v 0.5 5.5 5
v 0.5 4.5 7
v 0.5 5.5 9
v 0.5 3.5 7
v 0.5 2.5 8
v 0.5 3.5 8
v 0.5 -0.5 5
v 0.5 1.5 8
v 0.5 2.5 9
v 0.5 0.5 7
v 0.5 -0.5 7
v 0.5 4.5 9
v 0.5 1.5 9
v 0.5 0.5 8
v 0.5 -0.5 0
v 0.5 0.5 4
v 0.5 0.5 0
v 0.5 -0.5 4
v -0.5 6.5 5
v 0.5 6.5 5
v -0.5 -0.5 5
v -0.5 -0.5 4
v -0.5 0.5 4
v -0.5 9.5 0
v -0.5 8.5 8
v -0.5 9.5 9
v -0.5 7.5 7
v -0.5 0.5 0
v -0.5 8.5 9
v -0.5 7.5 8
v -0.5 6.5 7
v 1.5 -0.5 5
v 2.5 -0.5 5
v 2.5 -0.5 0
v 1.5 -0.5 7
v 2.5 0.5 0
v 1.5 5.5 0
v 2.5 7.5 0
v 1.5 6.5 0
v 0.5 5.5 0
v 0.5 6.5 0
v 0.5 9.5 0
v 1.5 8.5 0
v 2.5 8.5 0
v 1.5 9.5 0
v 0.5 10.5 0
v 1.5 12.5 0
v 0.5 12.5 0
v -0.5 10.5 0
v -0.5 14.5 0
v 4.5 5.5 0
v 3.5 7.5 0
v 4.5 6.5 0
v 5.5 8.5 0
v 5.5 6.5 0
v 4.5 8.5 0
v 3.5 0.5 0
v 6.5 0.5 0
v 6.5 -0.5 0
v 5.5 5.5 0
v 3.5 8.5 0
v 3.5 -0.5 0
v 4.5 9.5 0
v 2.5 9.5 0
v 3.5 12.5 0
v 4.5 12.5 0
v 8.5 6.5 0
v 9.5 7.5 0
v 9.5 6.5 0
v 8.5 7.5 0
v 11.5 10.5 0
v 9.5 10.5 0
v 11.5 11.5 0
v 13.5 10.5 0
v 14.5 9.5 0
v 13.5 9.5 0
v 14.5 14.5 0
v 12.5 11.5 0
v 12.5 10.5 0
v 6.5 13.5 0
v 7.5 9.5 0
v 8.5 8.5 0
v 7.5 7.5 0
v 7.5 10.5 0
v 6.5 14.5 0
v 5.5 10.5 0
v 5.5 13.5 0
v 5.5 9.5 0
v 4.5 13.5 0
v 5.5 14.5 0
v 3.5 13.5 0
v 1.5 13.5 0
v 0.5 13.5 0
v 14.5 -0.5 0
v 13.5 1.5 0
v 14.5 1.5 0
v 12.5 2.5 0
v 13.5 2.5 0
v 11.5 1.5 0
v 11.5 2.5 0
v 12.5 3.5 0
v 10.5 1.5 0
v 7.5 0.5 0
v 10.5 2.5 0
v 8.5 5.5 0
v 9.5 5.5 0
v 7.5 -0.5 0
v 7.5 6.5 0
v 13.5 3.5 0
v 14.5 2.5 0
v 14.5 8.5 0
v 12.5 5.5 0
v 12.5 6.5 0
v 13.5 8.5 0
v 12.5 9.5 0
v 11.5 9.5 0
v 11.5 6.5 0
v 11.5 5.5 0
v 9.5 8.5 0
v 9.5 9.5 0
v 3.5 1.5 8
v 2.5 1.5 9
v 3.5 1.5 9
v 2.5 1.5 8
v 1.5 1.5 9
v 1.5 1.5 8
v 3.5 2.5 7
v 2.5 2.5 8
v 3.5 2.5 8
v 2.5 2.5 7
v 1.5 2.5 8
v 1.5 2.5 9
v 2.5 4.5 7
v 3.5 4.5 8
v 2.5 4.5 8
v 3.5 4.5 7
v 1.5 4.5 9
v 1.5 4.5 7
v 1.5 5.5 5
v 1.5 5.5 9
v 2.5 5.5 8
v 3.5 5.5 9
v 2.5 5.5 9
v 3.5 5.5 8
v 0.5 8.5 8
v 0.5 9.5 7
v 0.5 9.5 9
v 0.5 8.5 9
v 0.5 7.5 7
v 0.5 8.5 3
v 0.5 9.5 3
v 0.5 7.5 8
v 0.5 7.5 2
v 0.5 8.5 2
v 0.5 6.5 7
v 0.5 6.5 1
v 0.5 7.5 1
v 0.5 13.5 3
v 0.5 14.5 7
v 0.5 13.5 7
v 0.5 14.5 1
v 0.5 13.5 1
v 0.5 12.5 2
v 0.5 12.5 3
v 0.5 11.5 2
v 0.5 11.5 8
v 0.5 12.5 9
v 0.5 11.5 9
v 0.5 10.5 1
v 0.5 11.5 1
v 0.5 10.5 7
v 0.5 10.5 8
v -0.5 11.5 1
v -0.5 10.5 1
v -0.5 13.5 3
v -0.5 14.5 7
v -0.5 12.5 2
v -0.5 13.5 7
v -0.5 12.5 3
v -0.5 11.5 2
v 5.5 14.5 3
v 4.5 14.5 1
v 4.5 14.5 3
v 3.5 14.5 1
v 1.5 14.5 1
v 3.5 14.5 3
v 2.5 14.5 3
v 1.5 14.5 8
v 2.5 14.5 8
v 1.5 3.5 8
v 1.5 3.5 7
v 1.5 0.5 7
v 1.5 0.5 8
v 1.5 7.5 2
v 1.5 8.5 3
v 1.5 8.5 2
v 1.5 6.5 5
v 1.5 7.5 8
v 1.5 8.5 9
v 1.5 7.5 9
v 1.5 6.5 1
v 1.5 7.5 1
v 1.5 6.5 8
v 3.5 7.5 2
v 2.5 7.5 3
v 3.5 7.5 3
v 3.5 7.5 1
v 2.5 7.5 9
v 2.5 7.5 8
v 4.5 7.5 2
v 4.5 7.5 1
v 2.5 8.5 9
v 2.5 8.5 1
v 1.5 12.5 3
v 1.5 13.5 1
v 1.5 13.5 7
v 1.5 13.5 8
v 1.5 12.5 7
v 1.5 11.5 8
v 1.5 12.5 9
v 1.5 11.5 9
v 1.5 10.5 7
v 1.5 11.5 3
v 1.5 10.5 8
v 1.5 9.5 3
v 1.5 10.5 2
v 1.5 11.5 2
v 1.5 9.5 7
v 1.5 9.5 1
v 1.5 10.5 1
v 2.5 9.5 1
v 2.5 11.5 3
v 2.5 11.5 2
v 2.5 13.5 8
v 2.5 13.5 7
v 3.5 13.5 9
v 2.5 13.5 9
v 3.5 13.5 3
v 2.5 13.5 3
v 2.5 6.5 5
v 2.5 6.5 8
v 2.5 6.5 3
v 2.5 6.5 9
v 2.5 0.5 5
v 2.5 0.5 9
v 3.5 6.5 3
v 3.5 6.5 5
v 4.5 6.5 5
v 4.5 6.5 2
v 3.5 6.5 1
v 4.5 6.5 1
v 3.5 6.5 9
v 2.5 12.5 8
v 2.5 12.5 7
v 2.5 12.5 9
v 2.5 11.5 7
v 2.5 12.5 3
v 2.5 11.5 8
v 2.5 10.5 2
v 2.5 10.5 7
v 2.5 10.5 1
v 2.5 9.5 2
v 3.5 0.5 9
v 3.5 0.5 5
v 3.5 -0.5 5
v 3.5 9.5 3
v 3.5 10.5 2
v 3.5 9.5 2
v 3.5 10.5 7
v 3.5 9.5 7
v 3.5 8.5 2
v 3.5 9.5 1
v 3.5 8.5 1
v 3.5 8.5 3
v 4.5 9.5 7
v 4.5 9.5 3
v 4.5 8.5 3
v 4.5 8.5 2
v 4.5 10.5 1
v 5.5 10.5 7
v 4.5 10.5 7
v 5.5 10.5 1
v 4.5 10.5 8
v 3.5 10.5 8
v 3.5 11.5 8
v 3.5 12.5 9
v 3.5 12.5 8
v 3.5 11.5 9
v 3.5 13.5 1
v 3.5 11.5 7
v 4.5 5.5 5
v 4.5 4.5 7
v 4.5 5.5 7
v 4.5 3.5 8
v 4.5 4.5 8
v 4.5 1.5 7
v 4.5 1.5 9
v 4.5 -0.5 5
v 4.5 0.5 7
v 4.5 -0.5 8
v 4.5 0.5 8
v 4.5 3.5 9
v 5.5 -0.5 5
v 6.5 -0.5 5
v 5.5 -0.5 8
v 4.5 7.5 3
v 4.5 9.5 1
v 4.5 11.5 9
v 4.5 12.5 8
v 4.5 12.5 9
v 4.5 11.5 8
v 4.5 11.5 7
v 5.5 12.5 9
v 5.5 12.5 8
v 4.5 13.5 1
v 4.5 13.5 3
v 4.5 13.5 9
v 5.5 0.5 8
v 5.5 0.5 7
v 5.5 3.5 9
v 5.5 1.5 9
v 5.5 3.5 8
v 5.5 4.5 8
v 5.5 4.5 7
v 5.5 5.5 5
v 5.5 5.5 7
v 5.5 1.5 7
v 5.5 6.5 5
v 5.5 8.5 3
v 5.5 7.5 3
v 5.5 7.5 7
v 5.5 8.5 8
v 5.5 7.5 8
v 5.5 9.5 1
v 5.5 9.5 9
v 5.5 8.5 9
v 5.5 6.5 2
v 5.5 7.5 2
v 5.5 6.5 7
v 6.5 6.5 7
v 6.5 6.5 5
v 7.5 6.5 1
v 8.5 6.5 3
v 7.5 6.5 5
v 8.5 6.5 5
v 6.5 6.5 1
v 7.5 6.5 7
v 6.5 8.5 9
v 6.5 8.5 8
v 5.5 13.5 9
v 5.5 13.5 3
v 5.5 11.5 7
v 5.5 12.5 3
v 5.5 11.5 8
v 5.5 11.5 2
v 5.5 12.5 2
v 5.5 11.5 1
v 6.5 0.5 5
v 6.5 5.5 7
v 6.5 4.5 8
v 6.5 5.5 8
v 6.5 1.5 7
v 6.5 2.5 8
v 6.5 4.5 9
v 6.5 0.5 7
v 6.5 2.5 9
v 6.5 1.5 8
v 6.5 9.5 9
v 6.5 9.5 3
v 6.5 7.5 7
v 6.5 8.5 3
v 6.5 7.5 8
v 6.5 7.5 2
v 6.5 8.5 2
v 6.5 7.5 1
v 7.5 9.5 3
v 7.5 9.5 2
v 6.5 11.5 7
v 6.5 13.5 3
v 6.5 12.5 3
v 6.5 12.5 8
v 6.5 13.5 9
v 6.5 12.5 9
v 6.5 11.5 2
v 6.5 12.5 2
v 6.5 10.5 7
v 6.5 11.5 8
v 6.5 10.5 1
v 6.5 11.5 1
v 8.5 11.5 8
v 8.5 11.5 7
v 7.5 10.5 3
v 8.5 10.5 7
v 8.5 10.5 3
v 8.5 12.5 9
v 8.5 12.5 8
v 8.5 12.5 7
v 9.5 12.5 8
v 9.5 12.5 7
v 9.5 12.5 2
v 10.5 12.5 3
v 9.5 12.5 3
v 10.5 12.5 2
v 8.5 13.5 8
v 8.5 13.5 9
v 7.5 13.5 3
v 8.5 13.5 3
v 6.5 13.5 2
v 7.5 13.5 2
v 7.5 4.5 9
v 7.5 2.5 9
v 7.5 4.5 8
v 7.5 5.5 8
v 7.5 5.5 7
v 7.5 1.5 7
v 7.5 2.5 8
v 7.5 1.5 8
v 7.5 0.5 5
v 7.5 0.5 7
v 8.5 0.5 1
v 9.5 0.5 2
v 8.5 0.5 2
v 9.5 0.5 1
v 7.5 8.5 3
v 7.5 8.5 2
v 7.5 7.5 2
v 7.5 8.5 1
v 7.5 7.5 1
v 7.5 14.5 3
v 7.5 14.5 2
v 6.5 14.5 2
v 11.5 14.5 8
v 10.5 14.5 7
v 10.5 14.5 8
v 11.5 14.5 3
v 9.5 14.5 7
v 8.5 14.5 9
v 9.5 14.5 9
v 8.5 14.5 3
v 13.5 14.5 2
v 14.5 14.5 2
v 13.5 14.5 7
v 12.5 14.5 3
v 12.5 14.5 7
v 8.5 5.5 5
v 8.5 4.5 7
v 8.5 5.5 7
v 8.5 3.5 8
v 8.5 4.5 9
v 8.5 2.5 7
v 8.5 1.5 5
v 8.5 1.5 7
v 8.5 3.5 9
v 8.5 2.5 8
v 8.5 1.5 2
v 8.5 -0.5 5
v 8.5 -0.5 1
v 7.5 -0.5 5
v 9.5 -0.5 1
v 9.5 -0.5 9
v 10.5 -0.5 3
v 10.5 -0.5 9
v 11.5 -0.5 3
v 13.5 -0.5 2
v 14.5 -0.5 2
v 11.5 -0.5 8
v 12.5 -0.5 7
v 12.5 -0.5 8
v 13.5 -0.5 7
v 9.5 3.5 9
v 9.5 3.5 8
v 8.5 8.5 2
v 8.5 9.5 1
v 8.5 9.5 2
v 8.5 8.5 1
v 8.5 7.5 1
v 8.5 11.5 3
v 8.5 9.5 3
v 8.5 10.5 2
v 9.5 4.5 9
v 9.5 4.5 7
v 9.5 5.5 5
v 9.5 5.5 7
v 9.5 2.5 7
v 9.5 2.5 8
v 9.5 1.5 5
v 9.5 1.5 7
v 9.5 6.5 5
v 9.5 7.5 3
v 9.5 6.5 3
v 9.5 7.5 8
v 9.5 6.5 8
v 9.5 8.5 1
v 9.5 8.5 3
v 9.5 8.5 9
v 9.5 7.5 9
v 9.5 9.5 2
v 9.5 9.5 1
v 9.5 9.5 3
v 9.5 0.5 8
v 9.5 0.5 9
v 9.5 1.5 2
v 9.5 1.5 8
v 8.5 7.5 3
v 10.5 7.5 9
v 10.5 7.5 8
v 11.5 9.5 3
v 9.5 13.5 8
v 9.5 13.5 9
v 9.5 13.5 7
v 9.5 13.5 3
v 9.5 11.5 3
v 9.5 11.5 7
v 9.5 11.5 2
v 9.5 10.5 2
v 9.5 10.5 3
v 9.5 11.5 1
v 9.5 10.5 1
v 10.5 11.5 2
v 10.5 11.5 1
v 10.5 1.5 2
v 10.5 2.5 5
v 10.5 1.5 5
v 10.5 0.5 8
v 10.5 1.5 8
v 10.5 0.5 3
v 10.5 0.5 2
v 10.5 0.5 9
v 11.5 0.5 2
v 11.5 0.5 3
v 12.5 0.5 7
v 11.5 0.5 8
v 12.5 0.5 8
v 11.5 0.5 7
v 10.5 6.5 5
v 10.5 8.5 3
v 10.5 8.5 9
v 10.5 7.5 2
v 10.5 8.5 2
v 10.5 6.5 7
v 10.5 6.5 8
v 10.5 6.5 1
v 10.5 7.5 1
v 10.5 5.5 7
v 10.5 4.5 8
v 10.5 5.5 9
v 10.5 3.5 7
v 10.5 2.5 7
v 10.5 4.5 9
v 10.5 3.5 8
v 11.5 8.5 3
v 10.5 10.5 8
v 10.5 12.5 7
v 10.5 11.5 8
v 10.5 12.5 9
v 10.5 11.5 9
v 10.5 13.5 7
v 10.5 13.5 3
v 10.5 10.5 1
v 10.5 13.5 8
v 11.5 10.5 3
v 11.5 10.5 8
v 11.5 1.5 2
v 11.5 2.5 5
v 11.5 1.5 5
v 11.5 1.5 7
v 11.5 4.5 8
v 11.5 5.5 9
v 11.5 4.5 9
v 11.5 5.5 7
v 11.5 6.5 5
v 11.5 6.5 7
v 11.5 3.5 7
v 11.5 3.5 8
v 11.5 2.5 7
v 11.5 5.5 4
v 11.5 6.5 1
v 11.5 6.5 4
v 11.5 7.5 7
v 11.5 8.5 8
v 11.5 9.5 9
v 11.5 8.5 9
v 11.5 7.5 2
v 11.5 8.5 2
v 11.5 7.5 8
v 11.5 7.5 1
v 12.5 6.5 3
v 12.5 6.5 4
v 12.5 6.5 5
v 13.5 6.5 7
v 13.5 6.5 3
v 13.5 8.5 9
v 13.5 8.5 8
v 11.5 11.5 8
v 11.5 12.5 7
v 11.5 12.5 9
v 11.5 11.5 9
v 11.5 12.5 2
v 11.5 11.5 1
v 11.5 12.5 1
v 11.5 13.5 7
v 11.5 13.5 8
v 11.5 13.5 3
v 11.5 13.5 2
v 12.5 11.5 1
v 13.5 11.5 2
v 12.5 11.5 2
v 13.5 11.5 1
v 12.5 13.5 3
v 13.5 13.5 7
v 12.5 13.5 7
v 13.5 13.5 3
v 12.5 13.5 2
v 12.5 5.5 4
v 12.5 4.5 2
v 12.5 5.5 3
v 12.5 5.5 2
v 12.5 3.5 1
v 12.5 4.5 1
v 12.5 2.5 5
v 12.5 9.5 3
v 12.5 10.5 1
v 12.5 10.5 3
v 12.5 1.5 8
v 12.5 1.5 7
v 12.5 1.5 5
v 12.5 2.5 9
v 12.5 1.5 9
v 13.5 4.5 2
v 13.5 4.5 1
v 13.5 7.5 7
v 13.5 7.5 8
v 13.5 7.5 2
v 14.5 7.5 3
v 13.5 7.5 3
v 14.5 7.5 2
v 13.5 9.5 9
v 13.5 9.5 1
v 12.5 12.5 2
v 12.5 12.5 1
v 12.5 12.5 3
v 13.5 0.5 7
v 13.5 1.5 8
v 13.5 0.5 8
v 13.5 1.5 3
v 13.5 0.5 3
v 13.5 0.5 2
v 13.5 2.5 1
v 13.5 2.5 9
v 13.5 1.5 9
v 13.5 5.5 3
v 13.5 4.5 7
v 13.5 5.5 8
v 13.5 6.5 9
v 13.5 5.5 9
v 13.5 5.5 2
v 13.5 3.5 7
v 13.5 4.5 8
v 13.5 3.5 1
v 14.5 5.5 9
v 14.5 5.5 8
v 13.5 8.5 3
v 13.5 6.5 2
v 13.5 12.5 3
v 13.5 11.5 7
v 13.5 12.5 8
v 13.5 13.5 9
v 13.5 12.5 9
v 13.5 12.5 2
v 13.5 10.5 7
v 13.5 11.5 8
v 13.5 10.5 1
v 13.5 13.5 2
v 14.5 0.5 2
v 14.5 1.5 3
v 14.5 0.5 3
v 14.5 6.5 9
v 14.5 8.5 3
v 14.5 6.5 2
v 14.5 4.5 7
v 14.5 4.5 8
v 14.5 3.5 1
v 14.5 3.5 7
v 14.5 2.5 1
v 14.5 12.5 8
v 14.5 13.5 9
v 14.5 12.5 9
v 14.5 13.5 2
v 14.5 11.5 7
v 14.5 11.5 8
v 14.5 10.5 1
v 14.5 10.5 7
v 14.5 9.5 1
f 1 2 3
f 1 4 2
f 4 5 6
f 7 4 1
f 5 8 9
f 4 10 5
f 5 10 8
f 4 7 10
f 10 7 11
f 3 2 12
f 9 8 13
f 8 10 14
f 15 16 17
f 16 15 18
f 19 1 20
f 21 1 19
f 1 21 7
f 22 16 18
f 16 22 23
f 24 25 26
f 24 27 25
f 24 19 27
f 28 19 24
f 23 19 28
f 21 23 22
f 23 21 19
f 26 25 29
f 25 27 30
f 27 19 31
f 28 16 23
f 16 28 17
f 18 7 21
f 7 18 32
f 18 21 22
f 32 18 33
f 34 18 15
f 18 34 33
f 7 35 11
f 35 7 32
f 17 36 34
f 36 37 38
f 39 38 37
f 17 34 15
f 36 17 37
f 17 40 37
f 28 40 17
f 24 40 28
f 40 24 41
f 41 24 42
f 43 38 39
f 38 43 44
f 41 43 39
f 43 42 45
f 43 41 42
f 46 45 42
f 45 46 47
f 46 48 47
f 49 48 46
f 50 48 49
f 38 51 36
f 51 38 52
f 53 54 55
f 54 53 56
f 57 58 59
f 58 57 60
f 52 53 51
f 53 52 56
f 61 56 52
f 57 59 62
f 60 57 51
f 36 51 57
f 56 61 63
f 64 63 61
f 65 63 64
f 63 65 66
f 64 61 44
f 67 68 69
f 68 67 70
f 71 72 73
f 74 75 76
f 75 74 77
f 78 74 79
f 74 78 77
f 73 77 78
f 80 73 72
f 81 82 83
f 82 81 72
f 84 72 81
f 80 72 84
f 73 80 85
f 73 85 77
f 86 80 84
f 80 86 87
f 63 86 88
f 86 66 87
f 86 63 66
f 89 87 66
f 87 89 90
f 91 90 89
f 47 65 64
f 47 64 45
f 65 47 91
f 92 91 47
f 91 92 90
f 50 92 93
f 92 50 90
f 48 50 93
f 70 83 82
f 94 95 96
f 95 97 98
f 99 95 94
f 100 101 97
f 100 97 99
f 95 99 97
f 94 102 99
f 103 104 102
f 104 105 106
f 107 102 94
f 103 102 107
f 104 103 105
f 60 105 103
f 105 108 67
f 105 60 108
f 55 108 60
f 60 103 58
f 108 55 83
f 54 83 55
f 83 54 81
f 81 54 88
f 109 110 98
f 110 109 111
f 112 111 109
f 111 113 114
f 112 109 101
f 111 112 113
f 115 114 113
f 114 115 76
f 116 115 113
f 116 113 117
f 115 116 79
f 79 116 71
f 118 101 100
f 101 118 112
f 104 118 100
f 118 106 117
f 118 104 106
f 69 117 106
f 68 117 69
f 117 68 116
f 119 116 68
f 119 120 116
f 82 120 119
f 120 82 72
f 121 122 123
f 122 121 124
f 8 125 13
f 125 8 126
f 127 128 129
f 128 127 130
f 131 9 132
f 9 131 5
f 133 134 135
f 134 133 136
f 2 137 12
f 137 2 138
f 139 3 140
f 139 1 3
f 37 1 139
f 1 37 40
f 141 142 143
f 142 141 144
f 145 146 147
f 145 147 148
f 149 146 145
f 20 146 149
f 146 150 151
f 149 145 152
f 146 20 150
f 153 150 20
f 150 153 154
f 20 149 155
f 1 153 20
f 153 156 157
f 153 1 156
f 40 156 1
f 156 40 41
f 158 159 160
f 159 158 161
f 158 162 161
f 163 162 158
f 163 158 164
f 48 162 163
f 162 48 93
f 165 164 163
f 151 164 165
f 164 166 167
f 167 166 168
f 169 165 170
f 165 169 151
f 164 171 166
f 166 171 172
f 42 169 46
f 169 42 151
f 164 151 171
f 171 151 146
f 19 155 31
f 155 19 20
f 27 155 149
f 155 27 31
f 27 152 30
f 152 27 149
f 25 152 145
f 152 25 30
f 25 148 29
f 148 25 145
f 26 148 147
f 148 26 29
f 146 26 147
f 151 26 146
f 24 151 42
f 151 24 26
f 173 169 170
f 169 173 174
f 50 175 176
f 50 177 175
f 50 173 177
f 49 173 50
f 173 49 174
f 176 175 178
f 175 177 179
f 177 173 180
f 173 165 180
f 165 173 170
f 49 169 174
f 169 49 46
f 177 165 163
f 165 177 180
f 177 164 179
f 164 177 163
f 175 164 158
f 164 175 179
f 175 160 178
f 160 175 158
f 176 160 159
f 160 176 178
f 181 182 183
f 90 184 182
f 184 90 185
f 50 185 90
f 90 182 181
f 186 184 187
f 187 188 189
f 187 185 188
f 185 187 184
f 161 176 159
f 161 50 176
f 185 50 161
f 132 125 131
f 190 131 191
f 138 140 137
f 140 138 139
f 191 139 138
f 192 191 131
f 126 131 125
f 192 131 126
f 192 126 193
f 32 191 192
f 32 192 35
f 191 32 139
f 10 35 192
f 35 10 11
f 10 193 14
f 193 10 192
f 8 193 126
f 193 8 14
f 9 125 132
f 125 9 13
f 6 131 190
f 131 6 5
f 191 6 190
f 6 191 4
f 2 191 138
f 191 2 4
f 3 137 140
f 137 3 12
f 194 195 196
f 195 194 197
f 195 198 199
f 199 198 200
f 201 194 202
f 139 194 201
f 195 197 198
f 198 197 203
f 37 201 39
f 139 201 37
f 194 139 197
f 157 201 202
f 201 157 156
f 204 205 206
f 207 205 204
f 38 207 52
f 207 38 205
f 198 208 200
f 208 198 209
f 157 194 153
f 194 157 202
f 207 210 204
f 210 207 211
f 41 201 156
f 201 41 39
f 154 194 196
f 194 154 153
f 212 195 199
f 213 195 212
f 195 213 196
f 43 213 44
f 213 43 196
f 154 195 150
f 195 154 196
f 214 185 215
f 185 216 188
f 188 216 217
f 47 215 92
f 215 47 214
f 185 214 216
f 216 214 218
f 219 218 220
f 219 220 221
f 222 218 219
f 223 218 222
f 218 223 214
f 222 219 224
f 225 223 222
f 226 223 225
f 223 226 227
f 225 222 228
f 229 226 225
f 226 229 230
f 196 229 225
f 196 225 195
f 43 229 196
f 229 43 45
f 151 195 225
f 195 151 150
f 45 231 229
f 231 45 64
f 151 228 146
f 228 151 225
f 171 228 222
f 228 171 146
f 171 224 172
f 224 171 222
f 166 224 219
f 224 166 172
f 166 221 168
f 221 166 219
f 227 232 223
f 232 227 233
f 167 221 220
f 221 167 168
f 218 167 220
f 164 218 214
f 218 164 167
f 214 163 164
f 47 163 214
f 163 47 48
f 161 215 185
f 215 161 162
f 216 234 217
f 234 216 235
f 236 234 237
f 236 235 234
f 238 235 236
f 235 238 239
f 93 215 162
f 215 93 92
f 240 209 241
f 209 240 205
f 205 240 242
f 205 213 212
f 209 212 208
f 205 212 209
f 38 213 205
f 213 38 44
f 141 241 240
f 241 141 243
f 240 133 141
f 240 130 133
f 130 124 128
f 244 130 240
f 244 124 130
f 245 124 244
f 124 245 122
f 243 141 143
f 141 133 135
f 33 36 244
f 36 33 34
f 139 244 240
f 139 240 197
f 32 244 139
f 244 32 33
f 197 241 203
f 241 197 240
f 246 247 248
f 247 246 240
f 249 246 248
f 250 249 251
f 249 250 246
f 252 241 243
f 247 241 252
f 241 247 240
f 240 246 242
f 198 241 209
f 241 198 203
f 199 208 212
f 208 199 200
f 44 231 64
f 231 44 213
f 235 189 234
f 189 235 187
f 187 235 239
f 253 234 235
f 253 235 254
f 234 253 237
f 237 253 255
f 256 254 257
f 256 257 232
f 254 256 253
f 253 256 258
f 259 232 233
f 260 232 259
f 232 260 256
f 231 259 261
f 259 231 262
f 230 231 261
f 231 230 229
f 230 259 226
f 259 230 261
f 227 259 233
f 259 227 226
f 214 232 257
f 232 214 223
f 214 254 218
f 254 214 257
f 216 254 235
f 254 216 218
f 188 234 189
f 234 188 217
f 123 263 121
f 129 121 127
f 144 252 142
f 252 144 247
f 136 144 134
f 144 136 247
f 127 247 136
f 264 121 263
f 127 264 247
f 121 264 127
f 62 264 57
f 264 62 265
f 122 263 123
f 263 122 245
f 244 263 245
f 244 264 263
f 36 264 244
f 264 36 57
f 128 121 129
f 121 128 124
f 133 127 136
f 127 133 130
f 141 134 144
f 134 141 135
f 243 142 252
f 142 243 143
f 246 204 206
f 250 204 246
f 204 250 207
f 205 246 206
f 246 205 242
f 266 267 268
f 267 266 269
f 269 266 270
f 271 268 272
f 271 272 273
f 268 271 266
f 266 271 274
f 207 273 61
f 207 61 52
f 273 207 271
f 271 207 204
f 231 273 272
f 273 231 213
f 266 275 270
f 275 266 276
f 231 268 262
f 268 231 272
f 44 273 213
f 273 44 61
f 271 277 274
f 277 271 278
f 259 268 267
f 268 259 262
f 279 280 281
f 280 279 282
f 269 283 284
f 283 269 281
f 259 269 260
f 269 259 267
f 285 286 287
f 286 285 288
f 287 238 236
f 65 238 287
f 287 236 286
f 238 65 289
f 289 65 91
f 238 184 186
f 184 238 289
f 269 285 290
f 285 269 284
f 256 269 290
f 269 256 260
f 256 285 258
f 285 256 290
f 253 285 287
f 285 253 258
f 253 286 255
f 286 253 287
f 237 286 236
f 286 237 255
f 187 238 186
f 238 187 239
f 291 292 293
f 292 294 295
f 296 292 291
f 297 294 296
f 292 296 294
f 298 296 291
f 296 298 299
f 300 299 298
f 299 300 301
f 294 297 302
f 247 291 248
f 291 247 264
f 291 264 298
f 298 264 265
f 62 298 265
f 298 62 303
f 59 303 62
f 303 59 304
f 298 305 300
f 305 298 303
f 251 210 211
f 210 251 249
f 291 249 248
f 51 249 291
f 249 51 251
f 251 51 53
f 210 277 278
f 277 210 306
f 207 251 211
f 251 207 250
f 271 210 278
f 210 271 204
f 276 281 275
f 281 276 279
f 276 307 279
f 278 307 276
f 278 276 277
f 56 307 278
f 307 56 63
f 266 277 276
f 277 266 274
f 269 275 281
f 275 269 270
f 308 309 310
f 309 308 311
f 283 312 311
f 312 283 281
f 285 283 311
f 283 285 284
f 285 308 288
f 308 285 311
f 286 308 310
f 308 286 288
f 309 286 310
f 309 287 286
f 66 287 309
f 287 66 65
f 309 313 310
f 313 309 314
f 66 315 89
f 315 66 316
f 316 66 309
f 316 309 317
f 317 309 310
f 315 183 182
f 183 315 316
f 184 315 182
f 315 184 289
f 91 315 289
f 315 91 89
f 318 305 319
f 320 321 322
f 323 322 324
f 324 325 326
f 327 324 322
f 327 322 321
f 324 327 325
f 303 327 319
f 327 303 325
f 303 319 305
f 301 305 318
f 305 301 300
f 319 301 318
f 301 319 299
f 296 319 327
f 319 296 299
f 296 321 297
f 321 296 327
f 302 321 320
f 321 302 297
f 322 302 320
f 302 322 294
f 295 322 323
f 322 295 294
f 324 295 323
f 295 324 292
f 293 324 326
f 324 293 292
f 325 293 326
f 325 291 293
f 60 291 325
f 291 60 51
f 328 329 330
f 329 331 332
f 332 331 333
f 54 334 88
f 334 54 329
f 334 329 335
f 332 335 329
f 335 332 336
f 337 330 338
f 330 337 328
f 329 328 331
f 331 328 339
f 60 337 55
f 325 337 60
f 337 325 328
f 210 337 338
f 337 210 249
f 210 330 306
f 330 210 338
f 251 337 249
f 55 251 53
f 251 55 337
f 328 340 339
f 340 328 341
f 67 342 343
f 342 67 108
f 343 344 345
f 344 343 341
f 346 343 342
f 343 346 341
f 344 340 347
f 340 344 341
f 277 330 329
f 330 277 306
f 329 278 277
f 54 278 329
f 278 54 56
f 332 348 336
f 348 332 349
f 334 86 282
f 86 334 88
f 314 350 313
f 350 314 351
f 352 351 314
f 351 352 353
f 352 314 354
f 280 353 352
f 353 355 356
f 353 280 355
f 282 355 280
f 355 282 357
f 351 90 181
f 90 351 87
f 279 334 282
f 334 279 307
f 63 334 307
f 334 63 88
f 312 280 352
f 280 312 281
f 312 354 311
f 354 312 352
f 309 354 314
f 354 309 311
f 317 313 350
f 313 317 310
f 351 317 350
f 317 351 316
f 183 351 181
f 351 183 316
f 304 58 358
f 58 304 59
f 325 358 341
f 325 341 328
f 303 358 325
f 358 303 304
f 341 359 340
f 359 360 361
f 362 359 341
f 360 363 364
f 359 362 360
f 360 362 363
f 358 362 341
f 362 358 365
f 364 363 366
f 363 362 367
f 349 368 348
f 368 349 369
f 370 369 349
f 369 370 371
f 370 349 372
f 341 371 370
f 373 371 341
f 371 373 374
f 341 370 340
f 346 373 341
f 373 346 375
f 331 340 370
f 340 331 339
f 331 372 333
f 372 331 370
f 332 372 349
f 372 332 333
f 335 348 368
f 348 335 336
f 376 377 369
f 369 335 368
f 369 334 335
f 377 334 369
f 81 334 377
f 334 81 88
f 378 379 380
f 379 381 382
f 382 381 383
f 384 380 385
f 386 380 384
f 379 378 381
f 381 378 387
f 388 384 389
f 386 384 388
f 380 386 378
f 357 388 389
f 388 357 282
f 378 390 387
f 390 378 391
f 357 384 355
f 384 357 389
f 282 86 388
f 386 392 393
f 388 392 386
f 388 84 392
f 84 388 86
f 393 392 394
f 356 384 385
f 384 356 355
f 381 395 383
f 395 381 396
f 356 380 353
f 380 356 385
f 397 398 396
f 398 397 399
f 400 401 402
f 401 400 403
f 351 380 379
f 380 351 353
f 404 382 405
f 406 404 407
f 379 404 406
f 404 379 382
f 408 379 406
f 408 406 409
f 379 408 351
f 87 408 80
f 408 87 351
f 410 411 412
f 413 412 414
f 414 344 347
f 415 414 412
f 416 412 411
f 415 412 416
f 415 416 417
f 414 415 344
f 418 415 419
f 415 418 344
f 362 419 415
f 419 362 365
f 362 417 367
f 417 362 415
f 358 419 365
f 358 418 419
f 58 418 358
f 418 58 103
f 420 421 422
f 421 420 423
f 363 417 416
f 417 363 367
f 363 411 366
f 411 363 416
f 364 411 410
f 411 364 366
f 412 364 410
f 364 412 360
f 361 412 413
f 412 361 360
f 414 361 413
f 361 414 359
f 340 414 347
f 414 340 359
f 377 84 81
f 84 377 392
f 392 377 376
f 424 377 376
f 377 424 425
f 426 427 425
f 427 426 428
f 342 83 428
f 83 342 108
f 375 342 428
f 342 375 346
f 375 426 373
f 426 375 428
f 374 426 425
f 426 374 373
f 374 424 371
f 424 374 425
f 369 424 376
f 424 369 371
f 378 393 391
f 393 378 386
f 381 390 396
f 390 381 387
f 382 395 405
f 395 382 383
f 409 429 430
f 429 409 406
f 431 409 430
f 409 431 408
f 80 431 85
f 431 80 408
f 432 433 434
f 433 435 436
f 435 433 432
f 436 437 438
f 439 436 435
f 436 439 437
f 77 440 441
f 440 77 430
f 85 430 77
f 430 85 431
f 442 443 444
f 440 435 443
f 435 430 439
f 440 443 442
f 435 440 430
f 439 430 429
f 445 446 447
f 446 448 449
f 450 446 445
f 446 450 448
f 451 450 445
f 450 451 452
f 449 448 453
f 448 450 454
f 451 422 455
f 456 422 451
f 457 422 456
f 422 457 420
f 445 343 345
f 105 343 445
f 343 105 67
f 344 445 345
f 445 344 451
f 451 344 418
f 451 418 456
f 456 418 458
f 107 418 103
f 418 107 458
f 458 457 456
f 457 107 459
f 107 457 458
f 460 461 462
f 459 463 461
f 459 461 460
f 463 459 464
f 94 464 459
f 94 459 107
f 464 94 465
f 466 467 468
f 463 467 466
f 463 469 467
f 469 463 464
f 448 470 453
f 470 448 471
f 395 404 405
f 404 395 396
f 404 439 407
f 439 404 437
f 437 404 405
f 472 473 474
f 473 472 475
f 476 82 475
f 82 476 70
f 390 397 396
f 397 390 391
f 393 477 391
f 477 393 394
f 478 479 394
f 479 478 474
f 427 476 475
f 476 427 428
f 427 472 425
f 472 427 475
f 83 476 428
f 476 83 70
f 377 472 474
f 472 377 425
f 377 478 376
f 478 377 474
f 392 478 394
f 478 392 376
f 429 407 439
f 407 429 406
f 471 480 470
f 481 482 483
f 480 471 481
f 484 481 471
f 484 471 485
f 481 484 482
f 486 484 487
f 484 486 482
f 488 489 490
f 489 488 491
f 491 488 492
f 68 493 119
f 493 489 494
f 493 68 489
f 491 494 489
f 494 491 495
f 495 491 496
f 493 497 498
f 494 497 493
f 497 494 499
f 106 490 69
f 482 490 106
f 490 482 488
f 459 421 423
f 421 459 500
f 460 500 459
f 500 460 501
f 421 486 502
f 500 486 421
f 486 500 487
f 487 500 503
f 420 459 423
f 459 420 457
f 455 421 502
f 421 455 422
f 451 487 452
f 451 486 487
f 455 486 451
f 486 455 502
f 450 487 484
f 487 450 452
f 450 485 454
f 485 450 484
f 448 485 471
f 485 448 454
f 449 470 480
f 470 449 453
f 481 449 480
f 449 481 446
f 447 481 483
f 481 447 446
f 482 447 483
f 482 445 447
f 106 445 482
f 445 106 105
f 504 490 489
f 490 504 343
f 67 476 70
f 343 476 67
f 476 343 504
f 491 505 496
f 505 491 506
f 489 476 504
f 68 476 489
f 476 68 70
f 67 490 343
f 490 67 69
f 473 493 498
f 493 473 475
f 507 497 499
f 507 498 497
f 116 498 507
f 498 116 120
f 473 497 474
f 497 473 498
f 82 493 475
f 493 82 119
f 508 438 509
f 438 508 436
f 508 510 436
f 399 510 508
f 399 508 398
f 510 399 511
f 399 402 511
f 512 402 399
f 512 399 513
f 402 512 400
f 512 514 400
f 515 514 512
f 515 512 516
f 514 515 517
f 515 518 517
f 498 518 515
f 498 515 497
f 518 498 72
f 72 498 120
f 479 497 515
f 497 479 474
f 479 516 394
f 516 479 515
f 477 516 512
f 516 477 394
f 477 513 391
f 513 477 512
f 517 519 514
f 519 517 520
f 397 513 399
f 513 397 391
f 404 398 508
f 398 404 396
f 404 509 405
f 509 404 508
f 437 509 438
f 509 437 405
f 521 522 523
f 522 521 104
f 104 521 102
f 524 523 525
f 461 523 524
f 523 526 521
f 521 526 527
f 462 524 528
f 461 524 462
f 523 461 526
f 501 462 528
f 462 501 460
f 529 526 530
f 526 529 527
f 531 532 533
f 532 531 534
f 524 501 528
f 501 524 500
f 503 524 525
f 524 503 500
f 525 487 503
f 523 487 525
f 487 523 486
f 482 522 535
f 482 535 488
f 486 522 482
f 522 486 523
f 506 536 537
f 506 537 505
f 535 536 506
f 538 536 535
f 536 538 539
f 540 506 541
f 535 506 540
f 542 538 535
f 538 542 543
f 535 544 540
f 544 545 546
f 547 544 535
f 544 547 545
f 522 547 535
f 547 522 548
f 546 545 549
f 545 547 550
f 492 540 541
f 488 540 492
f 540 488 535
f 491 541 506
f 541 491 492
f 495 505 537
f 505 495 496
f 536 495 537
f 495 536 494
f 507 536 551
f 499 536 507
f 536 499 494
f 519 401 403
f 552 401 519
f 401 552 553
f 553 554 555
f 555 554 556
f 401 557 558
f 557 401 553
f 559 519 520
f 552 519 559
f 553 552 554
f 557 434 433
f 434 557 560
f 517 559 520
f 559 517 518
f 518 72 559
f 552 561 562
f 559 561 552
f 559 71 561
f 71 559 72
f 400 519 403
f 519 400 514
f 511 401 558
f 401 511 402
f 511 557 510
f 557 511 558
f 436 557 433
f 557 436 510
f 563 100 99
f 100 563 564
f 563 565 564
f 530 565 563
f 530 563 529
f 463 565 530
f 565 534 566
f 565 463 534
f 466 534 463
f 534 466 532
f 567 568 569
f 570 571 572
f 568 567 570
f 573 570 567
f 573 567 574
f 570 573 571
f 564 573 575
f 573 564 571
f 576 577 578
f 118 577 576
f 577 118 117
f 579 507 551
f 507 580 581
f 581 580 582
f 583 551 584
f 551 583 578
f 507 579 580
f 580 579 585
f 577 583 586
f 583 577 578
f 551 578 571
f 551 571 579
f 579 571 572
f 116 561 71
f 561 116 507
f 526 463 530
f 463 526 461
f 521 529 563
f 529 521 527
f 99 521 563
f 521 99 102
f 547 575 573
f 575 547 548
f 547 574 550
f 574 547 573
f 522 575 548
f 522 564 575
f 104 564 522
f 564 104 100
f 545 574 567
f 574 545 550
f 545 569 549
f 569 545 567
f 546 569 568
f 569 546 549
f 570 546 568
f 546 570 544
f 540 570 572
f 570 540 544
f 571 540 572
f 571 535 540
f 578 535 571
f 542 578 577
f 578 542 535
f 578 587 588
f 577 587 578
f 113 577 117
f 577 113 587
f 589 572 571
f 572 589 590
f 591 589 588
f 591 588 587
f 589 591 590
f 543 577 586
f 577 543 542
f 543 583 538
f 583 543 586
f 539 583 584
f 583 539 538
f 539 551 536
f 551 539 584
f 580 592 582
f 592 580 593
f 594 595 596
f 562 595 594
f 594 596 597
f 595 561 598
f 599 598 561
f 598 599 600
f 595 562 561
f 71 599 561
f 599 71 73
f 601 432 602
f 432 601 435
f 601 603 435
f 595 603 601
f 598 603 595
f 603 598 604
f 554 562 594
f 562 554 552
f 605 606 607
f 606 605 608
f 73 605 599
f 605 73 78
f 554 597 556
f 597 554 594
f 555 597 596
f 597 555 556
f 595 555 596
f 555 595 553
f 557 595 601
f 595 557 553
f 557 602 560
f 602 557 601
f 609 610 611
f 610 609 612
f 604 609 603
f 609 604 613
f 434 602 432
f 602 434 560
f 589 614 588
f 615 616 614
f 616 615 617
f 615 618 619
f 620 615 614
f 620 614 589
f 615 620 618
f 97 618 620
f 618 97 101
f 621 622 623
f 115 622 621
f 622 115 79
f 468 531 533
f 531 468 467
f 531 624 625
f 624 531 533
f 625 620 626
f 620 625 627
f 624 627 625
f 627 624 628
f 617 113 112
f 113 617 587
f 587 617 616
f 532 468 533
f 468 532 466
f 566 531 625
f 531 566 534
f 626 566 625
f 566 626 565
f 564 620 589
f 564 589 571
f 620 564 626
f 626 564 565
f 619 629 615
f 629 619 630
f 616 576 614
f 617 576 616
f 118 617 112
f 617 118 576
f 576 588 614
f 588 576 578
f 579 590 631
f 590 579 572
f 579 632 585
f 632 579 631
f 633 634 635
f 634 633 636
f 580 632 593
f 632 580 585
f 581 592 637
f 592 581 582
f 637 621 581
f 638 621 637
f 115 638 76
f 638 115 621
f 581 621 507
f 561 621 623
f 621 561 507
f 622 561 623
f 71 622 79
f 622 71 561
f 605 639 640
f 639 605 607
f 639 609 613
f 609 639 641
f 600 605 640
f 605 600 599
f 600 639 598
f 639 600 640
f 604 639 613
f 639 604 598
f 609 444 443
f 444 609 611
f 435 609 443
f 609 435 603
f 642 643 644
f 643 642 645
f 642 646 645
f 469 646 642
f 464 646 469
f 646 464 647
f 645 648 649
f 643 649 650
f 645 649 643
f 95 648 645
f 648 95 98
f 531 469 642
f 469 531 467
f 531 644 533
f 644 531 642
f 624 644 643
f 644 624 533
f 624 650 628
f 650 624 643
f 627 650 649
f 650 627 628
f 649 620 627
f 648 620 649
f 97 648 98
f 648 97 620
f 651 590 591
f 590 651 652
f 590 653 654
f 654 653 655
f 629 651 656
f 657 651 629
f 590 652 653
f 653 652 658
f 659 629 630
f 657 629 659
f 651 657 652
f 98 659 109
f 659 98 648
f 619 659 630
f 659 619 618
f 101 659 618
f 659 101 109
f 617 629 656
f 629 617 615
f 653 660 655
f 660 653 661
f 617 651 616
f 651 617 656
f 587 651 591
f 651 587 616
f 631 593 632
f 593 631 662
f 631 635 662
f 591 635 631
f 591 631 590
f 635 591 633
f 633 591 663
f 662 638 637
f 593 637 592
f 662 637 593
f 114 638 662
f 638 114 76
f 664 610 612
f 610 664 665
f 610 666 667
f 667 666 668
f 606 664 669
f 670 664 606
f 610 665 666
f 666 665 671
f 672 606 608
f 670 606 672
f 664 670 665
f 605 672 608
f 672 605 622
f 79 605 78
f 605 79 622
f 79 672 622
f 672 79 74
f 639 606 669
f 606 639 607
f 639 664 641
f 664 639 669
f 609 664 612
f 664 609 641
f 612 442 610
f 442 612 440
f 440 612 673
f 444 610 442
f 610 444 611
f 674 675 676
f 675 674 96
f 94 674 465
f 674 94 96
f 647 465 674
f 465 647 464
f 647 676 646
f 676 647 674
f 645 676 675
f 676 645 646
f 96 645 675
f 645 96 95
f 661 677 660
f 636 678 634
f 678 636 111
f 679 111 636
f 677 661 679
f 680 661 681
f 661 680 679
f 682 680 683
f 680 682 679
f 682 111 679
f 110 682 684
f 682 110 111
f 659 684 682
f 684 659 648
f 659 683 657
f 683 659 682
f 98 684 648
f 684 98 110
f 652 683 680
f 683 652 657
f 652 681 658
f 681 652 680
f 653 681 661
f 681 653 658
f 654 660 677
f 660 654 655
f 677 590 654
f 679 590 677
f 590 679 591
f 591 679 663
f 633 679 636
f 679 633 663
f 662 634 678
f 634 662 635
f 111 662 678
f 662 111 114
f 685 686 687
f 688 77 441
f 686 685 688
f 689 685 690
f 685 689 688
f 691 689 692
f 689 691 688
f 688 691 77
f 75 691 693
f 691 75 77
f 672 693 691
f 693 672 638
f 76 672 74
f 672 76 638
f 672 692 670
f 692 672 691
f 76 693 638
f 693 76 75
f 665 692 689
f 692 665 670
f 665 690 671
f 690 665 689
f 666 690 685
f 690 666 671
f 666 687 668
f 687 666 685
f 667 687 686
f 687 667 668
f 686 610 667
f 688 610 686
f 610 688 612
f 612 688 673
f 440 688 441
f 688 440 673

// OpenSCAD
union() {
    translate([0, 0, 4.5]) color([1, 0, 0]) cube([1, 1, 1], center=true);
    translate([0, 1, 2.5]) cube([1, 1, 5], center=true);
    translate([0, 2, 2.5]) cube([1, 1, 5], center=true);
    translate([0, 3, 2.5]) cube([1, 1, 5], center=true);
    translate([0, 4, 2.5]) cube([1, 1, 5], center=true);
    translate([0, 5, 2.5]) cube([1, 1, 5], center=true);
    translate([0, 6, 2.5]) cube([1, 1, 5], center=true);
    translate([0, 7, 3.5]) cube([1, 1, 7], center=true);
    translate([0, 8, 4.0]) cube([1, 1, 8], center=true);
    translate([0, 9, 4.5]) cube([1, 1, 9], center=true);
    translate([0, 11, 0.5]) cube([1, 1, 1], center=true);
    translate([0, 12, 1.0]) cube([1, 1, 2], center=true);
    translate([0, 13, 1.5]) cube([1, 1, 3], center=true);
    translate([0, 14, 3.5]) cube([1, 1, 7], center=true);
    translate([1, 0, 3.5]) cube([1, 1, 7], center=true);
    translate([1, 1, 4.0]) cube([1, 1, 8], center=true);
    translate([1, 2, 4.5]) cube([1, 1, 9], center=true);
    translate([1, 3, 4.0]) cube([1, 1, 8], center=true);
    translate([1, 4, 3.5]) cube([1, 1, 7], center=true);
    translate([1, 5, 4.5]) cube([1, 1, 9], center=true);
    translate([1, 7, 0.5]) cube([1, 1, 1], center=true);
    translate([1, 8, 1.0]) cube([1, 1, 2], center=true);
    translate([1, 9, 1.5]) cube([1, 1, 3], center=true);
    translate([1, 10, 3.5]) cube([1, 1, 7], center=true);
    translate([1, 11, 4.0]) cube([1, 1, 8], center=true);
    translate([1, 12, 4.5]) cube([1, 1, 9], center=true);
    translate([1, 14, 0.5]) cube([1, 1, 1], center=true);
    translate([2, 0, 2.5]) cube([1, 1, 5], center=true);
    translate([2, 1, 2.5]) cube([1, 1, 5], center=true);
    translate([2, 2, 2.5]) cube([1, 1, 5], center=true);
    translate([2, 3, 2.5]) cube([1, 1, 5], center=true);
    translate([2, 4, 2.5]) cube([1, 1, 5], center=true);
    translate([2, 5, 2.5]) cube([1, 1, 5], center=true);
    translate([2, 6, 2.5]) cube([1, 1, 5], center=true);
    translate([2, 7, 4.0]) cube([1, 1, 8], center=true);
    translate([2, 8, 4.5]) cube([1, 1, 9], center=true);
    translate([2, 10, 0.5]) cube([1, 1, 1], center=true);
    translate([2, 11, 1.0]) cube([1, 1, 2], center=true);
    translate([2, 12, 1.5]) cube([1, 1, 3], center=true);
    translate([2, 13, 3.5]) cube([1, 1, 7], center=true);
    translate([2, 14, 4.0]) cube([1, 1, 8], center=true);
    translate([3, 1, 4.5]) cube([1, 1, 9], center=true);
    translate([3, 2, 4.0]) cube([1, 1, 8], center=true);
    translate([3, 3, 3.5]) cube([1, 1, 7], center=true);
    translate([3, 4, 3.5]) cube([1, 1, 7], center=true);
    translate([3, 5, 4.0]) cube([1, 1, 8], center=true);
    translate([3, 6, 4.5]) cube([1, 1, 9], center=true);
    translate([3, 7, 1.5]) cube([1, 1, 3], center=true);
    translate([3, 9, 0.5]) cube([1, 1, 1], center=true);
    translate([3, 10, 1.0]) cube([1, 1, 2], center=true);
    translate([3, 11, 3.5]) cube([1, 1, 7], center=true);
    translate([3, 12, 4.0]) cube([1, 1, 8], center=true);
    translate([3, 13, 4.5]) cube([1, 1, 9], center=true);
    translate([3, 14, 1.5]) cube([1, 1, 3], center=true);
    translate([4, 0, 2.5]) cube([1, 1, 5], center=true);
    translate([4, 1, 2.5]) cube([1, 1, 5], center=true);
    translate([4, 2, 2.5]) cube([1, 1, 5], center=true);
    translate([4, 3, 2.5]) cube([1, 1, 5], center=true);
    translate([4, 4, 2.5]) cube([1, 1, 5], center=true);
    translate([4, 5, 2.5]) cube([1, 1, 5], center=true);
    translate([4, 6, 2.5]) cube([1, 1, 5], center=true);
    translate([4, 7, 0.5]) cube([1, 1, 1], center=true);
    translate([4, 8, 1.0]) cube([1, 1, 2], center=true);
    translate([4, 9, 1.5]) cube([1, 1, 3], center=true);
    translate([4, 10, 3.5]) cube([1, 1, 7], center=true);
    translate([4, 11, 4.0]) cube([1, 1, 8], center=true);
    translate([4, 12, 4.5]) cube([1, 1, 9], center=true);
    translate([4, 14, 0.5]) cube([1, 1, 1], center=true);
    translate([5, 0, 4.0]) cube([1, 1, 8], center=true);
    translate([5, 1, 3.5]) cube([1, 1, 7], center=true);
    translate([5, 2, 4.5]) cube([1, 1, 9], center=true);
    translate([5, 3, 4.5]) cube([1, 1, 9], center=true);
    translate([5, 4, 4.0]) cube([1, 1, 8], center=true);
    translate([5, 5, 3.5]) cube([1, 1, 7], center=true);
    translate([5, 7, 1.0]) cube([1, 1, 2], center=true);
    translate([5, 8, 1.5]) cube([1, 1, 3], center=true);
    translate([5, 10, 0.5]) cube([1, 1, 1], center=true);
    translate([5, 11, 3.5]) cube([1, 1, 7], center=true);
    translate([5, 12, 4.0]) cube([1, 1, 8], center=true);
    translate([5, 13, 4.5]) cube([1, 1, 9], center=true);
    translate([5, 14, 1.5]) cube([1, 1, 3], center=true);
    translate([6, 0, 2.5]) cube([1, 1, 5], center=true);
    translate([6, 1, 2.5]) cube([1, 1, 5], center=true);
    translate([6, 2, 2.5]) cube([1, 1, 5], center=true);
    translate([6, 3, 2.5]) cube([1, 1, 5], center=true);
    translate([6, 4, 2.5]) cube([1, 1, 5], center=true);
    translate([6, 5, 2.5]) cube([1, 1, 5], center=true);
    translate([6, 6, 2.5]) cube([1, 1, 5], center=true);
    translate([6, 7, 3.5]) cube([1, 1, 7], center=true);
    translate([6, 8, 4.0]) cube([1, 1, 8], center=true);
    translate([6, 9, 4.5]) cube([1, 1, 9], center=true);
    translate([6, 11, 0.5]) cube([1, 1, 1], center=true);
    translate([6, 12, 1.0]) cube([1, 1, 2], center=true);
    translate([6, 13, 1.5]) cube([1, 1, 3], center=true);
    translate([7, 1, 3.5]) cube([1, 1, 7], center=true);
    translate([7, 2, 4.0]) cube([1, 1, 8], center=true);
    translate([7, 3, 4.5]) cube([1, 1, 9], center=true);
    translate([7, 4, 4.5]) cube([1, 1, 9], center=true);
    translate([7, 5, 4.0]) cube([1, 1, 8], center=true);
    translate([7, 6, 3.5]) cube([1, 1, 7], center=true);
    translate([7, 7, 0.5]) cube([1, 1, 1], center=true);
    translate([7, 8, 1.0]) cube([1, 1, 2], center=true);
    translate([7, 9, 1.5]) cube([1, 1, 3], center=true);
    translate([7, 11, 3.5]) cube([1, 1, 7], center=true);
    translate([7, 12, 4.0]) cube([1, 1, 8], center=true);
    translate([7, 13, 4.5]) cube([1, 1, 9], center=true);
    translate([7, 14, 1.0]) cube([1, 1, 2], center=true);
    translate([8, 0, 2.5]) cube([1, 1, 5], center=true);
    translate([8, 1, 2.5]) cube([1, 1, 5], center=true);
    translate([8, 2, 2.5]) cube([1, 1, 5], center=true);
    translate([8, 3, 2.5]) cube([1, 1, 5], center=true);
    translate([8, 4, 2.5]) cube([1, 1, 5], center=true);
    translate([8, 5, 2.5]) cube([1, 1, 5], center=true);
    translate([8, 6, 2.5]) cube([1, 1, 5], center=true);
    translate([8, 8, 0.5]) cube([1, 1, 1], center=true);
    translate([8, 9, 1.0]) cube([1, 1, 2], center=true);
    translate([8, 10, 1.5]) cube([1, 1, 3], center=true);
    translate([8, 11, 3.5]) cube([1, 1, 7], center=true);
    translate([8, 12, 4.0]) cube([1, 1, 8], center=true);
    translate([8, 13, 4.5]) cube([1, 1, 9], center=true);
    translate([8, 14, 1.5]) cube([1, 1, 3], center=true);
    translate([9, 0, 0.5]) cube([1, 1, 1], center=true);
    translate([9, 1, 1.0]) cube([1, 1, 2], center=true);
    translate([9, 2, 3.5]) cube([1, 1, 7], center=true);
    translate([9, 3, 4.0]) cube([1, 1, 8], center=true);
    translate([9, 4, 4.5]) cube([1, 1, 9], center=true);
    translate([9, 5, 3.5]) cube([1, 1, 7], center=true);
    translate([9, 7, 1.5]) cube([1, 1, 3], center=true);
    translate([9, 9, 0.5]) cube([1, 1, 1], center=true);
    translate([9, 10, 1.0]) cube([1, 1, 2], center=true);
    translate([9, 11, 1.5]) cube([1, 1, 3], center=true);
    translate([9, 12, 3.5]) cube([1, 1, 7], center=true);
    translate([9, 13, 4.0]) cube([1, 1, 8], center=true);
    translate([9, 14, 4.5]) cube([1, 1, 9], center=true);
    translate([10, 0, 4.5]) cube([1, 1, 9], center=true);
    translate([10, 1, 4.0]) cube([1, 1, 8], center=true);
    translate([10, 2, 2.5]) cube([1, 1, 5], center=true);
    translate([10, 3, 2.5]) cube([1, 1, 5], center=true);
    translate([10, 4, 2.5]) cube([1, 1, 5], center=true);
    translate([10, 5, 2.5]) cube([1, 1, 5], center=true);
    translate([10, 6, 2.5]) cube([1, 1, 5], center=true);
    translate([10, 7, 4.0]) cube([1, 1, 8], center=true);
    translate([10, 8, 4.5]) cube([1, 1, 9], center=true);
    translate([10, 9, 1.5]) cube([1, 1, 3], center=true);
    translate([10, 11, 0.5]) cube([1, 1, 1], center=true);
    translate([10, 12, 1.0]) cube([1, 1, 2], center=true);
    translate([10, 13, 1.5]) cube([1, 1, 3], center=true);
    translate([10, 14, 3.5]) cube([1, 1, 7], center=true);
    translate([11, 0, 1.5]) cube([1, 1, 3], center=true);
    translate([11, 1, 1.0]) cube([1, 1, 2], center=true);
    translate([11, 3, 3.5]) cube([1, 1, 7], center=true);
    translate([11, 4, 4.0]) cube([1, 1, 8], center=true);
    translate([11, 5, 4.5]) cube([1, 1, 9], center=true);
    translate([11, 6, 3.5]) cube([1, 1, 7], center=true);
    translate([11, 7, 0.5]) cube([1, 1, 1], center=true);
    translate([11, 8, 1.0]) cube([1, 1, 2], center=true);
    translate([11, 9, 1.5]) cube([1, 1, 3], center=true);
    translate([11, 11, 4.0]) cube([1, 1, 8], center=true);
    translate([11, 12, 4.5]) cube([1, 1, 9], center=true);
    translate([11, 13, 3.5]) cube([1, 1, 7], center=true);
    translate([11, 14, 4.0]) cube([1, 1, 8], center=true);
    translate([12, 0, 4.0]) cube([1, 1, 8], center=true);
    translate([12, 1, 3.5]) cube([1, 1, 7], center=true);
    translate([12, 2, 2.5]) cube([1, 1, 5], center=true);
    translate([12, 3, 2.5]) cube([1, 1, 5], center=true);
    translate([12, 4, 2.5]) cube([1, 1, 5], center=true);
    translate([12, 5, 2.5]) cube([1, 1, 5], center=true);
    translate([12, 6, 4.5]) color([0, 0, 1]) cube([1, 1, 1], center=true);
    translate([12, 7, 3.5]) cube([1, 1, 7], center=true);
    translate([12, 8, 4.0]) cube([1, 1, 8], center=true);
    translate([12, 9, 4.5]) cube([1, 1, 9], center=true);
    translate([12, 10, 1.5]) cube([1, 1, 3], center=true);
    translate([12, 12, 0.5]) cube([1, 1, 1], center=true);
    translate([12, 13, 1.0]) cube([1, 1, 2], center=true);
    translate([12, 14, 1.5]) cube([1, 1, 3], center=true);
    translate([13, 0, 3.5]) cube([1, 1, 7], center=true);
    translate([13, 1, 4.0]) cube([1, 1, 8], center=true);
    translate([13, 2, 4.5]) cube([1, 1, 9], center=true);
    translate([13, 4, 0.5]) cube([1, 1, 1], center=true);
    translate([13, 5, 1.0]) cube([1, 1, 2], center=true);
    translate([13, 6, 1.5]) cube([1, 1, 3], center=true);
    translate([13, 7, 3.5]) cube([1, 1, 7], center=true);
    translate([13, 8, 4.0]) cube([1, 1, 8], center=true);
    translate([13, 9, 4.5]) cube([1, 1, 9], center=true);
    translate([13, 11, 0.5]) cube([1, 1, 1], center=true);
    translate([13, 12, 1.0]) cube([1, 1, 2], center=true);
    translate([13, 13, 1.5]) cube([1, 1, 3], center=true);
    translate([13, 14, 3.5]) cube([1, 1, 7], center=true);
    translate([14, 0, 1.0]) cube([1, 1, 2], center=true);
    translate([14, 1, 1.5]) cube([1, 1, 3], center=true);
    translate([14, 3, 0.5]) cube([1, 1, 1], center=true);
    translate([14, 4, 3.5]) cube([1, 1, 7], center=true);
    translate([14, 5, 4.0]) cube([1, 1, 8], center=true);
    translate([14, 6, 4.5]) cube([1, 1, 9], center=true);
    translate([14, 7, 1.0]) cube([1, 1, 2], center=true);
    translate([14, 8, 1.5]) cube([1, 1, 3], center=true);
    translate([14, 10, 0.5]) cube([1, 1, 1], center=true);
    translate([14, 11, 3.5]) cube([1, 1, 7], center=true);
    translate([14, 12, 4.0]) cube([1, 1, 8], center=true);
    translate([14, 13, 4.5]) cube([1, 1, 9], center=true);
    translate([14, 14, 1.0]) cube([1, 1, 2], center=true);
}
